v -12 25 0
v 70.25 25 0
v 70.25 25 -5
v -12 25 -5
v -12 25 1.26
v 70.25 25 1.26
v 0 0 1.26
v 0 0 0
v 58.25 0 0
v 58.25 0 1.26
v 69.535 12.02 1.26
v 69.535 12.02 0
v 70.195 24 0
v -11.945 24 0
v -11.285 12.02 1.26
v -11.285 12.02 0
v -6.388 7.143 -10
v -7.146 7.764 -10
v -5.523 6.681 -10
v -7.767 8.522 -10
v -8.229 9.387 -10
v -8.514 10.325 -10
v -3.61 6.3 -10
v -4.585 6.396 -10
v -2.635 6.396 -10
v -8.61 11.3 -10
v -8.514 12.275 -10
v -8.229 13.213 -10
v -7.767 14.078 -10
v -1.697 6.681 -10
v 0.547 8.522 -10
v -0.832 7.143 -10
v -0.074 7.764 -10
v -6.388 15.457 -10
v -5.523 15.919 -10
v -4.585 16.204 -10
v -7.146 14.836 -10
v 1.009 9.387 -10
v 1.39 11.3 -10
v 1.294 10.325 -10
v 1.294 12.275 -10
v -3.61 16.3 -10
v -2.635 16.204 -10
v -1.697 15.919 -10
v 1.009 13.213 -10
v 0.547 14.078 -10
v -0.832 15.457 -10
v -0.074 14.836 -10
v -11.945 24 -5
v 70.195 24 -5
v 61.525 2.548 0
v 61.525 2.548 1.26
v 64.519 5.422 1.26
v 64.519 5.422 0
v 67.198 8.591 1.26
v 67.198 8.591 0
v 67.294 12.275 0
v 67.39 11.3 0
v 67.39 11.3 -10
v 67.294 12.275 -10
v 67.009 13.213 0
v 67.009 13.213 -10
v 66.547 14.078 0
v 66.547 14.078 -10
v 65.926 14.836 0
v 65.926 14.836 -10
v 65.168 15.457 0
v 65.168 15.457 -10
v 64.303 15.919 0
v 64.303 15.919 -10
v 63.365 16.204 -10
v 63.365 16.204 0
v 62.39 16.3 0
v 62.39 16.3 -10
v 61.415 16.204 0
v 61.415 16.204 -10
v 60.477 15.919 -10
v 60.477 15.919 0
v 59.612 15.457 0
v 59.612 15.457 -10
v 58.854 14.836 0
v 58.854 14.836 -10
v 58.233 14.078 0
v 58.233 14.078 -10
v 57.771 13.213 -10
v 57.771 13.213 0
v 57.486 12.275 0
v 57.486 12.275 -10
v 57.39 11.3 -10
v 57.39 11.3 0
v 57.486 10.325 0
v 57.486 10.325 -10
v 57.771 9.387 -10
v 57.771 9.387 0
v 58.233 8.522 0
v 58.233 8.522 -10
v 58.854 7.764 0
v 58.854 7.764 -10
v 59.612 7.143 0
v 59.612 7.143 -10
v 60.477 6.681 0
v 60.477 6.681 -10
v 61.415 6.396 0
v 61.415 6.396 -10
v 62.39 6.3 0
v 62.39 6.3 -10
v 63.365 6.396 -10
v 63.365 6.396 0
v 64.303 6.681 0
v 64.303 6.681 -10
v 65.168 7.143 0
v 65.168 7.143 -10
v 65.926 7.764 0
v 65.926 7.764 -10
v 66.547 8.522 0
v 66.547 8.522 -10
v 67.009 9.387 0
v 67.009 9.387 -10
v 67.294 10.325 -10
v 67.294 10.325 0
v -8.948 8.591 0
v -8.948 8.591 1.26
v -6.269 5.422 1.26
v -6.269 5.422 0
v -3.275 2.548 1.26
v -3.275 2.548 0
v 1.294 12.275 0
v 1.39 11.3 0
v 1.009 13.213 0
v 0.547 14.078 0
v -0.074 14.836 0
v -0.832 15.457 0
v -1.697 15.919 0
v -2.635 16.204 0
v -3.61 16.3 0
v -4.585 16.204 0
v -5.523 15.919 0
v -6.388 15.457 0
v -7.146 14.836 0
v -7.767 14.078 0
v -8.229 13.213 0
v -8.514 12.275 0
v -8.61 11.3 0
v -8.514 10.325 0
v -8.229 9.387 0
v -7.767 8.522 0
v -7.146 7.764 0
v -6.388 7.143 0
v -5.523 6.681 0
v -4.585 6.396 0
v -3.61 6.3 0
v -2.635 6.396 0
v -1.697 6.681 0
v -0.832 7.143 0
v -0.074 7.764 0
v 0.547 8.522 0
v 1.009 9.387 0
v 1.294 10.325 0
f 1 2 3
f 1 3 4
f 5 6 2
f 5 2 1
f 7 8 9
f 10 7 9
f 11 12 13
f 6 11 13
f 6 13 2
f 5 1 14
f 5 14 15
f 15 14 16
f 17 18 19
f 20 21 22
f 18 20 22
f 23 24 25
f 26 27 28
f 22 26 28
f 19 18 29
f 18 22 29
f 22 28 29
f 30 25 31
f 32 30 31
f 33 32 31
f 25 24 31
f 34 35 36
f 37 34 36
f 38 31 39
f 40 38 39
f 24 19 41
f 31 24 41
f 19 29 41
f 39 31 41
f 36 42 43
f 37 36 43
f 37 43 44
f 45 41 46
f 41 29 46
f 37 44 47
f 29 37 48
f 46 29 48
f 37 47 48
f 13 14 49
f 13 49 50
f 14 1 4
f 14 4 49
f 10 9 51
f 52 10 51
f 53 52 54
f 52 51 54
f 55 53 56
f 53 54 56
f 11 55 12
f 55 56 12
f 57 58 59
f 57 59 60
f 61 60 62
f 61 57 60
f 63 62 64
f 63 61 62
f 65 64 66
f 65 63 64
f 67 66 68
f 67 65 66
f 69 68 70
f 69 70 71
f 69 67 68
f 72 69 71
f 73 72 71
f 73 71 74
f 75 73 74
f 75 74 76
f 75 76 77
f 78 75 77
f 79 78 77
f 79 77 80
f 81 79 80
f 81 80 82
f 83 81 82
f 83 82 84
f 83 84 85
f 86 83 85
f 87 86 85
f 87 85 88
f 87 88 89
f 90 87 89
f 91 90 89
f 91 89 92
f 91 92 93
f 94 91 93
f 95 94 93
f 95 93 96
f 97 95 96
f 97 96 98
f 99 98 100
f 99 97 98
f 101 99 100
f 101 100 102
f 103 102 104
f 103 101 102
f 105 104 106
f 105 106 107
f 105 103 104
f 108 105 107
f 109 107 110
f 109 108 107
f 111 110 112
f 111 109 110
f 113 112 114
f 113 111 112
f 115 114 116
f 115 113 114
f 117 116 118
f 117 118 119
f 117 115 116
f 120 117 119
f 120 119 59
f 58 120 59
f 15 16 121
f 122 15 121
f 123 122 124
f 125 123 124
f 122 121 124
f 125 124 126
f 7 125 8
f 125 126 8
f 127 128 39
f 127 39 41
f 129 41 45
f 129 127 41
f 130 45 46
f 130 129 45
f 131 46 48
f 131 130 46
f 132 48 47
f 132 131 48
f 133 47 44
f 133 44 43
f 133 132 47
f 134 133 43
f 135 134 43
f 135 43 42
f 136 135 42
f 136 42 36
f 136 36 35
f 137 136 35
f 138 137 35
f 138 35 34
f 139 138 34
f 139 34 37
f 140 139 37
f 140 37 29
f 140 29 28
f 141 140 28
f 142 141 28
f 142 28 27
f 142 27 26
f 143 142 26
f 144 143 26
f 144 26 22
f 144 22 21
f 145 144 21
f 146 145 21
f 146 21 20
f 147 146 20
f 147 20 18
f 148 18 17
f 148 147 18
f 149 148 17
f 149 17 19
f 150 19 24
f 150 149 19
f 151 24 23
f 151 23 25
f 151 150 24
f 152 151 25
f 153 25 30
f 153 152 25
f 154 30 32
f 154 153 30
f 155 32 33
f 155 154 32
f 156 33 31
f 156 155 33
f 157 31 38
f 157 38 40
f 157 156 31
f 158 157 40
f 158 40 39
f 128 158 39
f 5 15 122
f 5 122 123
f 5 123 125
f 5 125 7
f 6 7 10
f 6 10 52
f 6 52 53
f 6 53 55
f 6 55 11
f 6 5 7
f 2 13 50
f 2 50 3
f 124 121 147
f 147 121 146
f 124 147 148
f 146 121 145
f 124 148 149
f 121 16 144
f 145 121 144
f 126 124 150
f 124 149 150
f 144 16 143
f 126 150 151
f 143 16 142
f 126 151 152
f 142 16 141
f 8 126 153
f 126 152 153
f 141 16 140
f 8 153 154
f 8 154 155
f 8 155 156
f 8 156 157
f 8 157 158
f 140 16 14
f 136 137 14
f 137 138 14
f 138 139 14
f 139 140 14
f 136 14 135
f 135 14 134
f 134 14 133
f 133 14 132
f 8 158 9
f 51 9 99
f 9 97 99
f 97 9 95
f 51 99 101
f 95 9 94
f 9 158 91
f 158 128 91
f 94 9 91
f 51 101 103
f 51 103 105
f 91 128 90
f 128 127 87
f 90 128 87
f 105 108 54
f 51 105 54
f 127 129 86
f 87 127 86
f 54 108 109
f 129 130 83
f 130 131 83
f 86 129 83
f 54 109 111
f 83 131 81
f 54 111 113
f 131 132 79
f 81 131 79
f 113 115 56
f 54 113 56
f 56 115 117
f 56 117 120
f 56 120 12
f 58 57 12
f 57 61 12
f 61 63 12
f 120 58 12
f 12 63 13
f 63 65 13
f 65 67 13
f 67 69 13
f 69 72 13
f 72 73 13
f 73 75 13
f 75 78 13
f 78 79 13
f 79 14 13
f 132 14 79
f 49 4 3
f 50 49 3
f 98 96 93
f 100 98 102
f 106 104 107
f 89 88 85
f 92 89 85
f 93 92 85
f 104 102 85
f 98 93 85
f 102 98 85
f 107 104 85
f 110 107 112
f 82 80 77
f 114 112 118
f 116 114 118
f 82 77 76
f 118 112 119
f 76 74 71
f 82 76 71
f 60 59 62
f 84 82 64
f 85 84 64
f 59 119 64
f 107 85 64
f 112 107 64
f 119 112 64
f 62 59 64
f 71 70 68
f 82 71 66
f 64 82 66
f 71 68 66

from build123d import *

# Parameters (mm, degrees)
RESSALTO_EXTRUS_O1_DEPTH = 1.26
ESBO_O2_R                = 5
RESSALTO_EXTRUS_O2_DEPTH = 11.26
RESSALTO_EXTRUS_O3_DEPTH = 5


with BuildPart() as part:
    # Esboço1 → Ressalto-extrusão1 (new body)
    with BuildSketch(Plane.XY):
        with BuildLine():
            Line((0, 0), (58.25, 0))
            ThreePointArc((58.25, 0), (64.518594138, 5.422084196), (69.535183289, 12.019667297))
            Line((69.535183289, 12.019667297), (70.25, 25))
            Line((70.25, 25), (-12, 25))
            Line((-12, 25), (-11.285183289, 12.019667297))
            ThreePointArc((-11.285183289, 12.019667297), (-6.268594138, 5.422084196), (0, 0))
        make_face()
    extrude(amount=RESSALTO_EXTRUS_O1_DEPTH)

    # Esboço2 → Ressalto-extrusão2 (add)
    with BuildSketch(Plane.XY.offset(1.26)):
        with Locations((-3.61, 11.3)):
            Circle(ESBO_O2_R)
        with Locations((62.39, 11.3)):
            Circle(ESBO_O2_R)
    extrude(amount=-RESSALTO_EXTRUS_O2_DEPTH)

    # Esboço3 → Ressalto-extrusão3 (add)
    with BuildSketch(Plane(origin=(0, 0, 0), x_dir=(-1, 0, 0), z_dir=(0, 0, -1))):
        Polygon((-70.25, 25), (12, 25), (11.944930787, 24), (-70.194930787, 24), align=None)
    extrude(amount=RESSALTO_EXTRUS_O3_DEPTH)


solid = part.part
